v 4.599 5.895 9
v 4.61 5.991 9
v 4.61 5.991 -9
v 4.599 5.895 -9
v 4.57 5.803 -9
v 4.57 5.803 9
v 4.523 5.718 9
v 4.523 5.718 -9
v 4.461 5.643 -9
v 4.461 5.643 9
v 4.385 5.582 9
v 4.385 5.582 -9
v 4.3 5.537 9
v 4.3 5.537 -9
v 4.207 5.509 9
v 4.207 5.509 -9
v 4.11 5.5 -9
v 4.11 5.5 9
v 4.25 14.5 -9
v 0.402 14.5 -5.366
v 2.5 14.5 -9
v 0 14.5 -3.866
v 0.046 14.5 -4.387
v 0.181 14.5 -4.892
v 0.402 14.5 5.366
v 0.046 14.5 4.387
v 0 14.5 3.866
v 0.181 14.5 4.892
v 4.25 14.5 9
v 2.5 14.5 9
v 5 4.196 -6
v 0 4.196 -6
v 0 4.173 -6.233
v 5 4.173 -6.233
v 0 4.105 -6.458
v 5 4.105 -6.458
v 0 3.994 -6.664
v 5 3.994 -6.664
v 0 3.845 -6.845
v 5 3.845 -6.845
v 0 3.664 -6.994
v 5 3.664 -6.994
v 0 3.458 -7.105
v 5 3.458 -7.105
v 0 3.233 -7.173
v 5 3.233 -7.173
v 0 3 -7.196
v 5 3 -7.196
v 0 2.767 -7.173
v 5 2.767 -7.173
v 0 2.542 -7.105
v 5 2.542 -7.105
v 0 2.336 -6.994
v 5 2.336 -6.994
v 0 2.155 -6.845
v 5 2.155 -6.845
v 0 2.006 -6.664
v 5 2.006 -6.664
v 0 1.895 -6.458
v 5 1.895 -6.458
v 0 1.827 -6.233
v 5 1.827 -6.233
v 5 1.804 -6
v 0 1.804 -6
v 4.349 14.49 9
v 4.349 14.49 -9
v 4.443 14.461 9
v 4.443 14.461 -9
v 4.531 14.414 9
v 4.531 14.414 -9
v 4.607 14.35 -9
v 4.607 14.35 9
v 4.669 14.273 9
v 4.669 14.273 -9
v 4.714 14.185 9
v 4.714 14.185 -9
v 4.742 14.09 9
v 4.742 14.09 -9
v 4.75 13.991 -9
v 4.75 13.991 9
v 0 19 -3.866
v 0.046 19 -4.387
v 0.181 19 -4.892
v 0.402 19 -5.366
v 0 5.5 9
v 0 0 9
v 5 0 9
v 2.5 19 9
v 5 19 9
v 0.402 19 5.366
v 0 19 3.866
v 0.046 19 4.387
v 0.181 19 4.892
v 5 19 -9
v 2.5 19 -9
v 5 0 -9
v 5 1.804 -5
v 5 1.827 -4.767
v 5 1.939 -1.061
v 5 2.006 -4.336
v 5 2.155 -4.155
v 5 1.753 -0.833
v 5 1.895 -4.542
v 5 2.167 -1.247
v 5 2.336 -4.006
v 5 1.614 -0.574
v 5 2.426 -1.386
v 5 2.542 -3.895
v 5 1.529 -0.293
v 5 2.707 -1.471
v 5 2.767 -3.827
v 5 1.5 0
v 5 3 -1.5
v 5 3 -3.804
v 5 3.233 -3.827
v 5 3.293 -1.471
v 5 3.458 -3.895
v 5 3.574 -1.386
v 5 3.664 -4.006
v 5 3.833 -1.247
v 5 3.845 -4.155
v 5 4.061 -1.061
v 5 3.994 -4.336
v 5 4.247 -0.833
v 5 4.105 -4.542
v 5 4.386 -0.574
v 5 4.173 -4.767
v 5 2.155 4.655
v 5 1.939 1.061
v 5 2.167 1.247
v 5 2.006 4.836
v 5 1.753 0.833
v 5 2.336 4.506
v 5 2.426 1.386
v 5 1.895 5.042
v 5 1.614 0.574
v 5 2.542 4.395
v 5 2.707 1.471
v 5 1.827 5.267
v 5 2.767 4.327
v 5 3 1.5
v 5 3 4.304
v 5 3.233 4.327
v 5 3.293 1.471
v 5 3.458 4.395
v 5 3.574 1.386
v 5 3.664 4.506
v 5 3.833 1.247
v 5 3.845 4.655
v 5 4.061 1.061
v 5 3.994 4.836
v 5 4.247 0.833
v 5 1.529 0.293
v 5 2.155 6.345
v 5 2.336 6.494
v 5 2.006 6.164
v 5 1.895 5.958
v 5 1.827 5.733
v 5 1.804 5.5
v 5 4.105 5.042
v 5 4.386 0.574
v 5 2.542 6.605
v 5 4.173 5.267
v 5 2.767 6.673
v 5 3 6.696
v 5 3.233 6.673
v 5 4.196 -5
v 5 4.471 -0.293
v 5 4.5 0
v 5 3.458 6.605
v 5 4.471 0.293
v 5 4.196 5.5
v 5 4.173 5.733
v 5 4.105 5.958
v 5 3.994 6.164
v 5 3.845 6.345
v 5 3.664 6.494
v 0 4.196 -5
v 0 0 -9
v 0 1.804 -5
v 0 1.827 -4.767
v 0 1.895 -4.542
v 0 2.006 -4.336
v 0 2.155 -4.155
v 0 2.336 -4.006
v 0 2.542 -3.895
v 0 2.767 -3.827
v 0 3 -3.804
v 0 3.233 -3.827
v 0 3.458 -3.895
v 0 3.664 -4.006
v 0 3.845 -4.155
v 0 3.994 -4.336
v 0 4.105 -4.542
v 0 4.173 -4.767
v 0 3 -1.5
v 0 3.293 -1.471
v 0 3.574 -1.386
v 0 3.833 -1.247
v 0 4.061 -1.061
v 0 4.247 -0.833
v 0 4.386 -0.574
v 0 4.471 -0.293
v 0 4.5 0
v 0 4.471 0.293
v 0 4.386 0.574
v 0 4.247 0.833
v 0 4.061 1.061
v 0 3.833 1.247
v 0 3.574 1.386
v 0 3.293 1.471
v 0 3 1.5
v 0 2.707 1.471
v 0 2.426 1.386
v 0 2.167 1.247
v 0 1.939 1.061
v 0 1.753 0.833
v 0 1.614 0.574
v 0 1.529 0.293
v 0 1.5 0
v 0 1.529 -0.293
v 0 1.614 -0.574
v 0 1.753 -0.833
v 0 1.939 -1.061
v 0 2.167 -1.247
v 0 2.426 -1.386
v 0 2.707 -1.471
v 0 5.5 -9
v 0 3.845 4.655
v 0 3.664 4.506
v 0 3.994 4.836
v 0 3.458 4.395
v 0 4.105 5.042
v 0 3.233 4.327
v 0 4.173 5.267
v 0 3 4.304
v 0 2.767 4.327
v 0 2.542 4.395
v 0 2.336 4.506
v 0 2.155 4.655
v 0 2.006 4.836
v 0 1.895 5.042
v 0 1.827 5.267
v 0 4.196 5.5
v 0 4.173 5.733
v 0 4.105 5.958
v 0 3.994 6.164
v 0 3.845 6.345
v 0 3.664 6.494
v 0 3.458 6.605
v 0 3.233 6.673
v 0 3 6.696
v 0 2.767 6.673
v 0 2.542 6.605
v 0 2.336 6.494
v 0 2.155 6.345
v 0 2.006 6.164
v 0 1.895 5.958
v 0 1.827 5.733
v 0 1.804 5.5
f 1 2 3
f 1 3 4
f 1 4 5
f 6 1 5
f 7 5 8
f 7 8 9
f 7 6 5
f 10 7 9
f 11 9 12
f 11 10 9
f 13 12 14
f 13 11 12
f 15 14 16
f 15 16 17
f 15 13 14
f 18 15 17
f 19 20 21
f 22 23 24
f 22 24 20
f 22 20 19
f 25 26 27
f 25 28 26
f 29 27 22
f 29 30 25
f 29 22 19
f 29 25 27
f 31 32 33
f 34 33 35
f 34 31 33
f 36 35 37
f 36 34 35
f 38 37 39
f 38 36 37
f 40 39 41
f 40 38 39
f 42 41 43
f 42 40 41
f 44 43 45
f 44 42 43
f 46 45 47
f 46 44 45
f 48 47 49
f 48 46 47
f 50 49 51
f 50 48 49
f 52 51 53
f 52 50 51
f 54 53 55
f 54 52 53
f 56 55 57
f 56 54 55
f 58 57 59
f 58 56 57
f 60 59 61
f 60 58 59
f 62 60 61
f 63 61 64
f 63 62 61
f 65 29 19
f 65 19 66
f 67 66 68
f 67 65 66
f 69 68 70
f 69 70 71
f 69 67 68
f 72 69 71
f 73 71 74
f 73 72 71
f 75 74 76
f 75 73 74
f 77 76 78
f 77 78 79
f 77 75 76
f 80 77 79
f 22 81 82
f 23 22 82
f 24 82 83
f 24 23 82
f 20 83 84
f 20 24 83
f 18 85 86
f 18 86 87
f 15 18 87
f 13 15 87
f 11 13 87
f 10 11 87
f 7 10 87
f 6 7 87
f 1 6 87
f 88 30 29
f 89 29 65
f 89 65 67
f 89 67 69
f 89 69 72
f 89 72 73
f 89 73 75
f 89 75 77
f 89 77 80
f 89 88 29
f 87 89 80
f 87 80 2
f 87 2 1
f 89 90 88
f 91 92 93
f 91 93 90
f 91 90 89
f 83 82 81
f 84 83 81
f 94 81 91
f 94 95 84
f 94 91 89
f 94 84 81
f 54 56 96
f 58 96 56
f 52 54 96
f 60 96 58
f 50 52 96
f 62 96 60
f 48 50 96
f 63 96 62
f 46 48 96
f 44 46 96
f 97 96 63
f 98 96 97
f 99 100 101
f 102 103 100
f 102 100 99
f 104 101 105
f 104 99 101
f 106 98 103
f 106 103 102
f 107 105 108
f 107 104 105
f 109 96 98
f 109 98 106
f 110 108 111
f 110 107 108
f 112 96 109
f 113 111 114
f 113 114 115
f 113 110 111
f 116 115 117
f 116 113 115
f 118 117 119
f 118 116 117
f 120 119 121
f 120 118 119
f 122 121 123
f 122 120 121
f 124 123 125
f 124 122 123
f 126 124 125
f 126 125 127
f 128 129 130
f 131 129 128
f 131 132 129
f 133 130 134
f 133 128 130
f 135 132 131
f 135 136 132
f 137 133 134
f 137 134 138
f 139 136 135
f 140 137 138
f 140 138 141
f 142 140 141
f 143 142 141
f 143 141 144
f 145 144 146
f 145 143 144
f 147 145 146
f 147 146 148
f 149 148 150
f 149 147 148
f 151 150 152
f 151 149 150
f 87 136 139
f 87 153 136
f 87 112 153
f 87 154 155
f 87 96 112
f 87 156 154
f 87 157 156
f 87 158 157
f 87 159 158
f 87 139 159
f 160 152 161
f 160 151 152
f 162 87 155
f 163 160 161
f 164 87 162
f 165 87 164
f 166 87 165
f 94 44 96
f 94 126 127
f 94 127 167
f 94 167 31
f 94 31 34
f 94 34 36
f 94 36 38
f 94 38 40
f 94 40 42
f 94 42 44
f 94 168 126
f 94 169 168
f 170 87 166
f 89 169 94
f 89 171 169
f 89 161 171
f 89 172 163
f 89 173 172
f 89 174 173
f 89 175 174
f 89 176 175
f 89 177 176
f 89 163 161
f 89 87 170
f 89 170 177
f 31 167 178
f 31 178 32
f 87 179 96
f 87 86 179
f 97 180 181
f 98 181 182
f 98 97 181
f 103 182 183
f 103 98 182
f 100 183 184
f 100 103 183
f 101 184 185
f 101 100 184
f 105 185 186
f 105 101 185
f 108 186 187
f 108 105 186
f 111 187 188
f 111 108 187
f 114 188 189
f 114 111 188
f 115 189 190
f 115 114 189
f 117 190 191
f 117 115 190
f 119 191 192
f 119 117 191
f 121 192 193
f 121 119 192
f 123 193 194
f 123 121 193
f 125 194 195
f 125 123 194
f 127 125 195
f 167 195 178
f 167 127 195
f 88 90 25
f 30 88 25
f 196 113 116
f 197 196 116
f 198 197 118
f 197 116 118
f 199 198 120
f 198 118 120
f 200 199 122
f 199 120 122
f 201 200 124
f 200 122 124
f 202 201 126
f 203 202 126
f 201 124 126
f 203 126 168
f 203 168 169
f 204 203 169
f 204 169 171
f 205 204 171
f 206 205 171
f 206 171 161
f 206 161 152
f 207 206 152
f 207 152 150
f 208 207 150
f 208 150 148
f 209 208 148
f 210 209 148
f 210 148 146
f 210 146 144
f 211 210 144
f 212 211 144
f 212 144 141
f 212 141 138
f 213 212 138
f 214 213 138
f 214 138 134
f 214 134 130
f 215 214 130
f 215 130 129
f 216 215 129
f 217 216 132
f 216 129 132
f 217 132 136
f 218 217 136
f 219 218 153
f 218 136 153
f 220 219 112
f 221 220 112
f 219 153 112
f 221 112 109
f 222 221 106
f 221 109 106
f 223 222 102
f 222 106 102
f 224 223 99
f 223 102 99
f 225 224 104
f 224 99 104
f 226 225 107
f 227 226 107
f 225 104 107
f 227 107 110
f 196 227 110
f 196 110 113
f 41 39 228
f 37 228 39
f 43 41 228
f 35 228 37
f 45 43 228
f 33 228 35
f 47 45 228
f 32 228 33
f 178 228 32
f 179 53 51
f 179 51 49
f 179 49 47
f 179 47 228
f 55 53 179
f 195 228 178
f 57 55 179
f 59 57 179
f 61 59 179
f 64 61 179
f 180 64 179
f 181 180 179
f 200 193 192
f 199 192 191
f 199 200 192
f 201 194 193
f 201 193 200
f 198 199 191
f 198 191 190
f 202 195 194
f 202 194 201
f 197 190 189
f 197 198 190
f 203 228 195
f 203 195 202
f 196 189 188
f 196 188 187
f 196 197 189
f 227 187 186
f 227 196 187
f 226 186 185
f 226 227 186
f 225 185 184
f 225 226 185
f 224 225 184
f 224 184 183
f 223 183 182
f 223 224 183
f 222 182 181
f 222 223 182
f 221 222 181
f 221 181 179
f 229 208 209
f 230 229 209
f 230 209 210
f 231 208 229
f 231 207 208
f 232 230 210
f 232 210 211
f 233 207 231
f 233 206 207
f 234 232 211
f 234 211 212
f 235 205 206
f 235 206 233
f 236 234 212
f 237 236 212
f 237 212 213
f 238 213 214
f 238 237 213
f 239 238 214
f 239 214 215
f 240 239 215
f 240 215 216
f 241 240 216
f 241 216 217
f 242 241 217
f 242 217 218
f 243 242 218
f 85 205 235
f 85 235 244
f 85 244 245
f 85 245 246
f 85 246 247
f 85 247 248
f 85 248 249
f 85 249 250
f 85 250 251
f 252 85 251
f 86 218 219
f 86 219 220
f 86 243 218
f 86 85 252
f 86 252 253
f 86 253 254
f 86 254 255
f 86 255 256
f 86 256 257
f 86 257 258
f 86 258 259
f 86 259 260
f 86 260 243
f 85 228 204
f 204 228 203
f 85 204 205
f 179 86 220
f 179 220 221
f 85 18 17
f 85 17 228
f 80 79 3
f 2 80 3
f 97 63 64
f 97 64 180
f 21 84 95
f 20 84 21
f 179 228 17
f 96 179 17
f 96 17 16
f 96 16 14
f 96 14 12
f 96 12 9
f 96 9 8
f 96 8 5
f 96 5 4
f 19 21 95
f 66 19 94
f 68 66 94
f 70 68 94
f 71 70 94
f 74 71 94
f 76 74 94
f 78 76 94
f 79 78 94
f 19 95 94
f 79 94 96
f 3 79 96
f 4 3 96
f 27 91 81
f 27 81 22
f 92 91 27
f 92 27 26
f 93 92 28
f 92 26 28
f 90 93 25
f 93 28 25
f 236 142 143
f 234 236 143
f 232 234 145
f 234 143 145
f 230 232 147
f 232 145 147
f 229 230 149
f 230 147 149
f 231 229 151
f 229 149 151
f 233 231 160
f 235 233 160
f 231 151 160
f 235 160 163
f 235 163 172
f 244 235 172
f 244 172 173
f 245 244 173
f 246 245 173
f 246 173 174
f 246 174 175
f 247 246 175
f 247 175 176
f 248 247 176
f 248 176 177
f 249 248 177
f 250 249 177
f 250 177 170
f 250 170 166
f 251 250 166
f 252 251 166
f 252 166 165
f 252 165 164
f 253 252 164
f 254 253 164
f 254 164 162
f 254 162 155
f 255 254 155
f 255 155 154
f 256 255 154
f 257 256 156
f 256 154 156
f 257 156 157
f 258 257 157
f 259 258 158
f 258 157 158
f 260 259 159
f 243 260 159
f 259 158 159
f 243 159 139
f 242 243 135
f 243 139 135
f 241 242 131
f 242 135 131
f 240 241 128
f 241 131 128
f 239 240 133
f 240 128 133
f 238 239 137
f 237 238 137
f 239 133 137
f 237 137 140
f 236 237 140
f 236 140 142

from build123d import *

# Parameters (mm, degrees)
BOSS_EXTRUDE1_DEPTH = 9
CHAMFER1_SIZE       = 2.5
CHAMFER1_SIZE2      = 4.330127019
FILLET1_R           = 3
SKETCH11_R          = 1.195625
SKETCH11_R_2        = 1.5
CUT_EXTRUDE1_DEPTH  = 6
CUT_EXTRUDE2_DEPTH  = 0.5


with BuildPart() as part:
    # Sketch4 → Boss-Extrude1 (new body)
    with BuildSketch(Plane.XY):
        with BuildLine():
            Line((0, 19.5), (0, 14.5))
            Line((0, 14.5), (4.250076152, 14.5))
            ThreePointArc((4.250076152, 14.5), (4.606701377, 14.350454632), (4.75, 13.991273797))
            Line((4.75, 13.991273797), (4.610359481, 5.991273797))
            ThreePointArc((4.610359481, 5.991273797), (4.460890265, 5.643374775), (4.110435633, 5.5))
            Line((4.110435633, 5.5), (0, 5.5))
            Line((0, 5.5), (0, 0))
            Line((0, 0), (5, 0))
            Line((5, 0), (5, 19.5))
            Line((5, 19.5), (0, 19.5))
        make_face()
    extrude(amount=BOSS_EXTRUDE1_DEPTH)

    # Chamfer1
    chamfer1_edges = [part.edges().sort_by_distance(p)[0] for p in [
        (0, 17, 9),
    ]]
    chamfer1_side = [part.faces().sort_by_distance(p)[0] for p in [
        (0.201308221, 17, 9),
    ]]
    chamfer(chamfer1_edges, length=CHAMFER1_SIZE, length2=CHAMFER1_SIZE2, reference=chamfer1_side[0])

    # Fillet1
    fillet1_edges = [part.edges().sort_by_distance(p)[0] for p in [
        (0, 17, 4.669872981),
    ]]
    fillet(fillet1_edges, radius=FILLET1_R)

    # Mirror1: part across plane


with BuildPart() as part_1:
    add(part.part)
    add(part.part.mirror(Plane(origin=(4.250076152, 14, 0), x_dir=(1, 0, 0), z_dir=(0, 0, -1))))

    # Sketch11 → Cut-Extrude1 (cut, through all)
    with BuildSketch(Plane(origin=(5, 0, 0), x_dir=(0, 0, -1), z_dir=(1, 0, 0))):
        with Locations((-5.5, 3)):
            Circle(SKETCH11_R)
        with Locations((0, 3)):
            Circle(SKETCH11_R_2)
        with BuildLine():
            Line((5, 4.195625), (6, 4.195625))
            ThreePointArc((6, 4.195625), (7.195625, 3), (6, 1.804375))
            Line((6, 1.804375), (5, 1.804375))
            ThreePointArc((5, 1.804375), (3.804375, 3), (5, 4.195625))
        make_face()
    extrude(amount=-CUT_EXTRUDE1_DEPTH, mode=Mode.SUBTRACT)

    # Sketch12 → Cut-Extrude2 (cut)
    with BuildSketch(Plane(origin=(0, 19.5, 0), x_dir=(1, 0, 0), z_dir=(0, 1, 0))):
        with BuildLine():
            Line((0, 3.866025404), (0, -3.866025404))
            ThreePointArc((0, -3.866025404), (0.102222521, -4.642482539), (0.401923789, -5.366025404))
            Line((0.401923789, -5.366025404), (2.5, -9))
            Line((2.5, -9), (5, -9))
            Line((5, -9), (5, 9))
            Line((5, 9), (2.5, 9))
            Line((2.5, 9), (0.401923789, 5.366025404))
            ThreePointArc((0.401923789, 5.366025404), (0.102222521, 4.642482539), (0, 3.866025404))
        make_face()
    extrude(amount=-CUT_EXTRUDE2_DEPTH, mode=Mode.SUBTRACT)


solid = part_1.part
